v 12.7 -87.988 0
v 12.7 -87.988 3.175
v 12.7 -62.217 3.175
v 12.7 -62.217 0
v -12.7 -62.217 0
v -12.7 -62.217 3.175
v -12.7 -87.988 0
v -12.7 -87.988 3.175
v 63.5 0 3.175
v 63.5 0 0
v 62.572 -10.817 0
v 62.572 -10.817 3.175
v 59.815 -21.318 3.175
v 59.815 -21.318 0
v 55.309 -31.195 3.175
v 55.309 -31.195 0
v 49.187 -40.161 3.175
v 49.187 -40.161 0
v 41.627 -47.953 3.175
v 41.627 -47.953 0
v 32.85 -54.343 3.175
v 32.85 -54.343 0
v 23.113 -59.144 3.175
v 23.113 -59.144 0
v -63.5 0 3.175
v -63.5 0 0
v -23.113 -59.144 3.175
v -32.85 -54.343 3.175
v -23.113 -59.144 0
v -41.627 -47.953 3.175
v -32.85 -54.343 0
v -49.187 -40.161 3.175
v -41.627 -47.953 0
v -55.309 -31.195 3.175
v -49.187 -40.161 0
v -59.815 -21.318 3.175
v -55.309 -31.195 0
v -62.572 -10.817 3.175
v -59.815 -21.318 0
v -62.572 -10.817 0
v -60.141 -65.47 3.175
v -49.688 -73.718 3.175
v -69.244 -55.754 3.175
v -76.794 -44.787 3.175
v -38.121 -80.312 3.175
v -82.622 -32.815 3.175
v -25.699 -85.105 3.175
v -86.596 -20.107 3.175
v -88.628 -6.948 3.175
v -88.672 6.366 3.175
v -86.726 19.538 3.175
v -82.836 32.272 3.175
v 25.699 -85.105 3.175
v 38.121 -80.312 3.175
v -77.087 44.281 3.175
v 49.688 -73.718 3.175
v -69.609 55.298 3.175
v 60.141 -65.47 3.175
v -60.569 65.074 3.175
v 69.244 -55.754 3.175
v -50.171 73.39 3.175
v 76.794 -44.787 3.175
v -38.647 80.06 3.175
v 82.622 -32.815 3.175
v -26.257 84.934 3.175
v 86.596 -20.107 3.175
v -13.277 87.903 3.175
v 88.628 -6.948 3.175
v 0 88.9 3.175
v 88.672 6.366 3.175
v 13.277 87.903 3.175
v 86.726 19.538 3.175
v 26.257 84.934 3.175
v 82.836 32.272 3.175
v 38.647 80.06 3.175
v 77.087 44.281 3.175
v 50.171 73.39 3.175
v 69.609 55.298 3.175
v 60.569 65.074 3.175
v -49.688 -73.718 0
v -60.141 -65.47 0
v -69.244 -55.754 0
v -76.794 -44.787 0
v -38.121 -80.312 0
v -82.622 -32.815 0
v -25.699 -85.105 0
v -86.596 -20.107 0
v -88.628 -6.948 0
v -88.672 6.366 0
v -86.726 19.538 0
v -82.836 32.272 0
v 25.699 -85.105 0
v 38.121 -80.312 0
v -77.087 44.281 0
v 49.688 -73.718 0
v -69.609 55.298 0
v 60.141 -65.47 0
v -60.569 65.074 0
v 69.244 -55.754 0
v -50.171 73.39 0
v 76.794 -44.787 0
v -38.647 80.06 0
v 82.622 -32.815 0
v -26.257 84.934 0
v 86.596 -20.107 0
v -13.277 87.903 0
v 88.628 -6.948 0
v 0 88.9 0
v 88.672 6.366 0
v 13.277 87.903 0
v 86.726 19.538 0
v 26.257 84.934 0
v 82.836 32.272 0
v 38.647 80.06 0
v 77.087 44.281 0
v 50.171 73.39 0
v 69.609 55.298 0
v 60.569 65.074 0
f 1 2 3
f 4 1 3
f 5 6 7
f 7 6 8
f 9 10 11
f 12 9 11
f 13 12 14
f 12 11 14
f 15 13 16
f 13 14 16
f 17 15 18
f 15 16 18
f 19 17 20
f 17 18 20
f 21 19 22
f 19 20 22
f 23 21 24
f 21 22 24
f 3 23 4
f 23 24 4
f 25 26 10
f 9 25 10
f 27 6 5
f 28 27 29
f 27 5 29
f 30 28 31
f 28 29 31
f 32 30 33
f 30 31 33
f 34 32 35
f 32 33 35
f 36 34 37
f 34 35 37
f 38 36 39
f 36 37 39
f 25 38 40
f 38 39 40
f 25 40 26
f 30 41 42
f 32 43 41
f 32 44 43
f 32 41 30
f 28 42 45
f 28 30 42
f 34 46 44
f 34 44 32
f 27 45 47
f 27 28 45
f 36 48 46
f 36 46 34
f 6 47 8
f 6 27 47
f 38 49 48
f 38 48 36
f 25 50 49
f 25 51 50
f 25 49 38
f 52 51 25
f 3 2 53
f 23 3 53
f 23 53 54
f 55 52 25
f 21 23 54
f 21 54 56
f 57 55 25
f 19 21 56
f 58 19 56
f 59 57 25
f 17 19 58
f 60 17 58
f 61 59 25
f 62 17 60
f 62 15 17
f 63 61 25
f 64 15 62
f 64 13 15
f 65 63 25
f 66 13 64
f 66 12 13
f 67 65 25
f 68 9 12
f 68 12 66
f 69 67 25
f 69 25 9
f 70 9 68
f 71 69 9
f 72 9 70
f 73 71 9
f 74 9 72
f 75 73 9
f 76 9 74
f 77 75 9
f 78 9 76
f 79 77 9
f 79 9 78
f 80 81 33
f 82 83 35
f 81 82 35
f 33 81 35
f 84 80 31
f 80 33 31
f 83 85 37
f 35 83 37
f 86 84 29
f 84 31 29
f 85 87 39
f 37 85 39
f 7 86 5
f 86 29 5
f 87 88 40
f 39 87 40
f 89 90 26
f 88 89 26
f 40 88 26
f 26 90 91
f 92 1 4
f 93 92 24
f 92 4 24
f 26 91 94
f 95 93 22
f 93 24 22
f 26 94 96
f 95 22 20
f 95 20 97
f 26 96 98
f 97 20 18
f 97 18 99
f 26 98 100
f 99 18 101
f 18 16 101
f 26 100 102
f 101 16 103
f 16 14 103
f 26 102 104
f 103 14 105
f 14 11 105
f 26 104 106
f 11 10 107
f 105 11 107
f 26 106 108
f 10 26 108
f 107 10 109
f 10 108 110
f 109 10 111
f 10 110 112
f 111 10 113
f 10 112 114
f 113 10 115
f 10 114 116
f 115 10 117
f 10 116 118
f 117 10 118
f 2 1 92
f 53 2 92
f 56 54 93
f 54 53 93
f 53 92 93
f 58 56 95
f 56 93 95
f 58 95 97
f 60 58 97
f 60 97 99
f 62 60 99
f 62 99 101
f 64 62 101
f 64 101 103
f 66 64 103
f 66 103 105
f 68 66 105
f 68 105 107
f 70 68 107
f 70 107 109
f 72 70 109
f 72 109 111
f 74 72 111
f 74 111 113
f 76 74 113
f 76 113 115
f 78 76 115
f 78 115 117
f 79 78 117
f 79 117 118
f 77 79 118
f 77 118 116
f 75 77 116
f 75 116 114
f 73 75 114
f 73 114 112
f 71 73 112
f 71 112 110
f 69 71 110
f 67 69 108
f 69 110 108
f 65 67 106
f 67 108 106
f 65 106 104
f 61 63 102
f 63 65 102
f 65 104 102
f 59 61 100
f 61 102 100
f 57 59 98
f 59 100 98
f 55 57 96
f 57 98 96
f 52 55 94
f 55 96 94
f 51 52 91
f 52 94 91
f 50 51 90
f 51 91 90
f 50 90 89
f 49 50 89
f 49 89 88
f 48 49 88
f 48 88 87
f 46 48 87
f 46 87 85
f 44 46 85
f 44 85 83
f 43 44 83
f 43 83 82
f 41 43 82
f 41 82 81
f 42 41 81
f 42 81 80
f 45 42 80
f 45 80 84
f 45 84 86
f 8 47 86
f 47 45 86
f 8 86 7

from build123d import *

# Parameters (mm, degrees)
F0_R     = 88.9
F1_DEPTH = 3.175
F3_DEPTH = 6.35


with BuildPart() as f1:
    # F0 (on Top) → F1 (new body)
    with BuildSketch(Plane.XY):
        Circle(F0_R)
        with BuildLine():
            ThreePointArc((-63.5, 0), (0, 63.5), (63.5, 0))
            ThreePointArc((63.5, 0), (0, -63.5), (-63.5, 0))
        make_face(mode=Mode.SUBTRACT)
        with BuildLine():
            Line((-63.5, 0), (63.5, 0))
            ThreePointArc((63.5, 0), (0, 63.5), (-63.5, 0))
        make_face()
    extrude(amount=F1_DEPTH)

    # F2 (on face) → F3 (cut)
    with BuildSketch(Plane.XY.offset(3.175)):
        Polygon((12.7, -58.594692), (0, -58.594692), (-12.7, -58.594692), (-12.7, -96.489258), (12.7, -96.489258), align=None)
    extrude(amount=-F3_DEPTH, mode=Mode.SUBTRACT)


solid = f1.part
